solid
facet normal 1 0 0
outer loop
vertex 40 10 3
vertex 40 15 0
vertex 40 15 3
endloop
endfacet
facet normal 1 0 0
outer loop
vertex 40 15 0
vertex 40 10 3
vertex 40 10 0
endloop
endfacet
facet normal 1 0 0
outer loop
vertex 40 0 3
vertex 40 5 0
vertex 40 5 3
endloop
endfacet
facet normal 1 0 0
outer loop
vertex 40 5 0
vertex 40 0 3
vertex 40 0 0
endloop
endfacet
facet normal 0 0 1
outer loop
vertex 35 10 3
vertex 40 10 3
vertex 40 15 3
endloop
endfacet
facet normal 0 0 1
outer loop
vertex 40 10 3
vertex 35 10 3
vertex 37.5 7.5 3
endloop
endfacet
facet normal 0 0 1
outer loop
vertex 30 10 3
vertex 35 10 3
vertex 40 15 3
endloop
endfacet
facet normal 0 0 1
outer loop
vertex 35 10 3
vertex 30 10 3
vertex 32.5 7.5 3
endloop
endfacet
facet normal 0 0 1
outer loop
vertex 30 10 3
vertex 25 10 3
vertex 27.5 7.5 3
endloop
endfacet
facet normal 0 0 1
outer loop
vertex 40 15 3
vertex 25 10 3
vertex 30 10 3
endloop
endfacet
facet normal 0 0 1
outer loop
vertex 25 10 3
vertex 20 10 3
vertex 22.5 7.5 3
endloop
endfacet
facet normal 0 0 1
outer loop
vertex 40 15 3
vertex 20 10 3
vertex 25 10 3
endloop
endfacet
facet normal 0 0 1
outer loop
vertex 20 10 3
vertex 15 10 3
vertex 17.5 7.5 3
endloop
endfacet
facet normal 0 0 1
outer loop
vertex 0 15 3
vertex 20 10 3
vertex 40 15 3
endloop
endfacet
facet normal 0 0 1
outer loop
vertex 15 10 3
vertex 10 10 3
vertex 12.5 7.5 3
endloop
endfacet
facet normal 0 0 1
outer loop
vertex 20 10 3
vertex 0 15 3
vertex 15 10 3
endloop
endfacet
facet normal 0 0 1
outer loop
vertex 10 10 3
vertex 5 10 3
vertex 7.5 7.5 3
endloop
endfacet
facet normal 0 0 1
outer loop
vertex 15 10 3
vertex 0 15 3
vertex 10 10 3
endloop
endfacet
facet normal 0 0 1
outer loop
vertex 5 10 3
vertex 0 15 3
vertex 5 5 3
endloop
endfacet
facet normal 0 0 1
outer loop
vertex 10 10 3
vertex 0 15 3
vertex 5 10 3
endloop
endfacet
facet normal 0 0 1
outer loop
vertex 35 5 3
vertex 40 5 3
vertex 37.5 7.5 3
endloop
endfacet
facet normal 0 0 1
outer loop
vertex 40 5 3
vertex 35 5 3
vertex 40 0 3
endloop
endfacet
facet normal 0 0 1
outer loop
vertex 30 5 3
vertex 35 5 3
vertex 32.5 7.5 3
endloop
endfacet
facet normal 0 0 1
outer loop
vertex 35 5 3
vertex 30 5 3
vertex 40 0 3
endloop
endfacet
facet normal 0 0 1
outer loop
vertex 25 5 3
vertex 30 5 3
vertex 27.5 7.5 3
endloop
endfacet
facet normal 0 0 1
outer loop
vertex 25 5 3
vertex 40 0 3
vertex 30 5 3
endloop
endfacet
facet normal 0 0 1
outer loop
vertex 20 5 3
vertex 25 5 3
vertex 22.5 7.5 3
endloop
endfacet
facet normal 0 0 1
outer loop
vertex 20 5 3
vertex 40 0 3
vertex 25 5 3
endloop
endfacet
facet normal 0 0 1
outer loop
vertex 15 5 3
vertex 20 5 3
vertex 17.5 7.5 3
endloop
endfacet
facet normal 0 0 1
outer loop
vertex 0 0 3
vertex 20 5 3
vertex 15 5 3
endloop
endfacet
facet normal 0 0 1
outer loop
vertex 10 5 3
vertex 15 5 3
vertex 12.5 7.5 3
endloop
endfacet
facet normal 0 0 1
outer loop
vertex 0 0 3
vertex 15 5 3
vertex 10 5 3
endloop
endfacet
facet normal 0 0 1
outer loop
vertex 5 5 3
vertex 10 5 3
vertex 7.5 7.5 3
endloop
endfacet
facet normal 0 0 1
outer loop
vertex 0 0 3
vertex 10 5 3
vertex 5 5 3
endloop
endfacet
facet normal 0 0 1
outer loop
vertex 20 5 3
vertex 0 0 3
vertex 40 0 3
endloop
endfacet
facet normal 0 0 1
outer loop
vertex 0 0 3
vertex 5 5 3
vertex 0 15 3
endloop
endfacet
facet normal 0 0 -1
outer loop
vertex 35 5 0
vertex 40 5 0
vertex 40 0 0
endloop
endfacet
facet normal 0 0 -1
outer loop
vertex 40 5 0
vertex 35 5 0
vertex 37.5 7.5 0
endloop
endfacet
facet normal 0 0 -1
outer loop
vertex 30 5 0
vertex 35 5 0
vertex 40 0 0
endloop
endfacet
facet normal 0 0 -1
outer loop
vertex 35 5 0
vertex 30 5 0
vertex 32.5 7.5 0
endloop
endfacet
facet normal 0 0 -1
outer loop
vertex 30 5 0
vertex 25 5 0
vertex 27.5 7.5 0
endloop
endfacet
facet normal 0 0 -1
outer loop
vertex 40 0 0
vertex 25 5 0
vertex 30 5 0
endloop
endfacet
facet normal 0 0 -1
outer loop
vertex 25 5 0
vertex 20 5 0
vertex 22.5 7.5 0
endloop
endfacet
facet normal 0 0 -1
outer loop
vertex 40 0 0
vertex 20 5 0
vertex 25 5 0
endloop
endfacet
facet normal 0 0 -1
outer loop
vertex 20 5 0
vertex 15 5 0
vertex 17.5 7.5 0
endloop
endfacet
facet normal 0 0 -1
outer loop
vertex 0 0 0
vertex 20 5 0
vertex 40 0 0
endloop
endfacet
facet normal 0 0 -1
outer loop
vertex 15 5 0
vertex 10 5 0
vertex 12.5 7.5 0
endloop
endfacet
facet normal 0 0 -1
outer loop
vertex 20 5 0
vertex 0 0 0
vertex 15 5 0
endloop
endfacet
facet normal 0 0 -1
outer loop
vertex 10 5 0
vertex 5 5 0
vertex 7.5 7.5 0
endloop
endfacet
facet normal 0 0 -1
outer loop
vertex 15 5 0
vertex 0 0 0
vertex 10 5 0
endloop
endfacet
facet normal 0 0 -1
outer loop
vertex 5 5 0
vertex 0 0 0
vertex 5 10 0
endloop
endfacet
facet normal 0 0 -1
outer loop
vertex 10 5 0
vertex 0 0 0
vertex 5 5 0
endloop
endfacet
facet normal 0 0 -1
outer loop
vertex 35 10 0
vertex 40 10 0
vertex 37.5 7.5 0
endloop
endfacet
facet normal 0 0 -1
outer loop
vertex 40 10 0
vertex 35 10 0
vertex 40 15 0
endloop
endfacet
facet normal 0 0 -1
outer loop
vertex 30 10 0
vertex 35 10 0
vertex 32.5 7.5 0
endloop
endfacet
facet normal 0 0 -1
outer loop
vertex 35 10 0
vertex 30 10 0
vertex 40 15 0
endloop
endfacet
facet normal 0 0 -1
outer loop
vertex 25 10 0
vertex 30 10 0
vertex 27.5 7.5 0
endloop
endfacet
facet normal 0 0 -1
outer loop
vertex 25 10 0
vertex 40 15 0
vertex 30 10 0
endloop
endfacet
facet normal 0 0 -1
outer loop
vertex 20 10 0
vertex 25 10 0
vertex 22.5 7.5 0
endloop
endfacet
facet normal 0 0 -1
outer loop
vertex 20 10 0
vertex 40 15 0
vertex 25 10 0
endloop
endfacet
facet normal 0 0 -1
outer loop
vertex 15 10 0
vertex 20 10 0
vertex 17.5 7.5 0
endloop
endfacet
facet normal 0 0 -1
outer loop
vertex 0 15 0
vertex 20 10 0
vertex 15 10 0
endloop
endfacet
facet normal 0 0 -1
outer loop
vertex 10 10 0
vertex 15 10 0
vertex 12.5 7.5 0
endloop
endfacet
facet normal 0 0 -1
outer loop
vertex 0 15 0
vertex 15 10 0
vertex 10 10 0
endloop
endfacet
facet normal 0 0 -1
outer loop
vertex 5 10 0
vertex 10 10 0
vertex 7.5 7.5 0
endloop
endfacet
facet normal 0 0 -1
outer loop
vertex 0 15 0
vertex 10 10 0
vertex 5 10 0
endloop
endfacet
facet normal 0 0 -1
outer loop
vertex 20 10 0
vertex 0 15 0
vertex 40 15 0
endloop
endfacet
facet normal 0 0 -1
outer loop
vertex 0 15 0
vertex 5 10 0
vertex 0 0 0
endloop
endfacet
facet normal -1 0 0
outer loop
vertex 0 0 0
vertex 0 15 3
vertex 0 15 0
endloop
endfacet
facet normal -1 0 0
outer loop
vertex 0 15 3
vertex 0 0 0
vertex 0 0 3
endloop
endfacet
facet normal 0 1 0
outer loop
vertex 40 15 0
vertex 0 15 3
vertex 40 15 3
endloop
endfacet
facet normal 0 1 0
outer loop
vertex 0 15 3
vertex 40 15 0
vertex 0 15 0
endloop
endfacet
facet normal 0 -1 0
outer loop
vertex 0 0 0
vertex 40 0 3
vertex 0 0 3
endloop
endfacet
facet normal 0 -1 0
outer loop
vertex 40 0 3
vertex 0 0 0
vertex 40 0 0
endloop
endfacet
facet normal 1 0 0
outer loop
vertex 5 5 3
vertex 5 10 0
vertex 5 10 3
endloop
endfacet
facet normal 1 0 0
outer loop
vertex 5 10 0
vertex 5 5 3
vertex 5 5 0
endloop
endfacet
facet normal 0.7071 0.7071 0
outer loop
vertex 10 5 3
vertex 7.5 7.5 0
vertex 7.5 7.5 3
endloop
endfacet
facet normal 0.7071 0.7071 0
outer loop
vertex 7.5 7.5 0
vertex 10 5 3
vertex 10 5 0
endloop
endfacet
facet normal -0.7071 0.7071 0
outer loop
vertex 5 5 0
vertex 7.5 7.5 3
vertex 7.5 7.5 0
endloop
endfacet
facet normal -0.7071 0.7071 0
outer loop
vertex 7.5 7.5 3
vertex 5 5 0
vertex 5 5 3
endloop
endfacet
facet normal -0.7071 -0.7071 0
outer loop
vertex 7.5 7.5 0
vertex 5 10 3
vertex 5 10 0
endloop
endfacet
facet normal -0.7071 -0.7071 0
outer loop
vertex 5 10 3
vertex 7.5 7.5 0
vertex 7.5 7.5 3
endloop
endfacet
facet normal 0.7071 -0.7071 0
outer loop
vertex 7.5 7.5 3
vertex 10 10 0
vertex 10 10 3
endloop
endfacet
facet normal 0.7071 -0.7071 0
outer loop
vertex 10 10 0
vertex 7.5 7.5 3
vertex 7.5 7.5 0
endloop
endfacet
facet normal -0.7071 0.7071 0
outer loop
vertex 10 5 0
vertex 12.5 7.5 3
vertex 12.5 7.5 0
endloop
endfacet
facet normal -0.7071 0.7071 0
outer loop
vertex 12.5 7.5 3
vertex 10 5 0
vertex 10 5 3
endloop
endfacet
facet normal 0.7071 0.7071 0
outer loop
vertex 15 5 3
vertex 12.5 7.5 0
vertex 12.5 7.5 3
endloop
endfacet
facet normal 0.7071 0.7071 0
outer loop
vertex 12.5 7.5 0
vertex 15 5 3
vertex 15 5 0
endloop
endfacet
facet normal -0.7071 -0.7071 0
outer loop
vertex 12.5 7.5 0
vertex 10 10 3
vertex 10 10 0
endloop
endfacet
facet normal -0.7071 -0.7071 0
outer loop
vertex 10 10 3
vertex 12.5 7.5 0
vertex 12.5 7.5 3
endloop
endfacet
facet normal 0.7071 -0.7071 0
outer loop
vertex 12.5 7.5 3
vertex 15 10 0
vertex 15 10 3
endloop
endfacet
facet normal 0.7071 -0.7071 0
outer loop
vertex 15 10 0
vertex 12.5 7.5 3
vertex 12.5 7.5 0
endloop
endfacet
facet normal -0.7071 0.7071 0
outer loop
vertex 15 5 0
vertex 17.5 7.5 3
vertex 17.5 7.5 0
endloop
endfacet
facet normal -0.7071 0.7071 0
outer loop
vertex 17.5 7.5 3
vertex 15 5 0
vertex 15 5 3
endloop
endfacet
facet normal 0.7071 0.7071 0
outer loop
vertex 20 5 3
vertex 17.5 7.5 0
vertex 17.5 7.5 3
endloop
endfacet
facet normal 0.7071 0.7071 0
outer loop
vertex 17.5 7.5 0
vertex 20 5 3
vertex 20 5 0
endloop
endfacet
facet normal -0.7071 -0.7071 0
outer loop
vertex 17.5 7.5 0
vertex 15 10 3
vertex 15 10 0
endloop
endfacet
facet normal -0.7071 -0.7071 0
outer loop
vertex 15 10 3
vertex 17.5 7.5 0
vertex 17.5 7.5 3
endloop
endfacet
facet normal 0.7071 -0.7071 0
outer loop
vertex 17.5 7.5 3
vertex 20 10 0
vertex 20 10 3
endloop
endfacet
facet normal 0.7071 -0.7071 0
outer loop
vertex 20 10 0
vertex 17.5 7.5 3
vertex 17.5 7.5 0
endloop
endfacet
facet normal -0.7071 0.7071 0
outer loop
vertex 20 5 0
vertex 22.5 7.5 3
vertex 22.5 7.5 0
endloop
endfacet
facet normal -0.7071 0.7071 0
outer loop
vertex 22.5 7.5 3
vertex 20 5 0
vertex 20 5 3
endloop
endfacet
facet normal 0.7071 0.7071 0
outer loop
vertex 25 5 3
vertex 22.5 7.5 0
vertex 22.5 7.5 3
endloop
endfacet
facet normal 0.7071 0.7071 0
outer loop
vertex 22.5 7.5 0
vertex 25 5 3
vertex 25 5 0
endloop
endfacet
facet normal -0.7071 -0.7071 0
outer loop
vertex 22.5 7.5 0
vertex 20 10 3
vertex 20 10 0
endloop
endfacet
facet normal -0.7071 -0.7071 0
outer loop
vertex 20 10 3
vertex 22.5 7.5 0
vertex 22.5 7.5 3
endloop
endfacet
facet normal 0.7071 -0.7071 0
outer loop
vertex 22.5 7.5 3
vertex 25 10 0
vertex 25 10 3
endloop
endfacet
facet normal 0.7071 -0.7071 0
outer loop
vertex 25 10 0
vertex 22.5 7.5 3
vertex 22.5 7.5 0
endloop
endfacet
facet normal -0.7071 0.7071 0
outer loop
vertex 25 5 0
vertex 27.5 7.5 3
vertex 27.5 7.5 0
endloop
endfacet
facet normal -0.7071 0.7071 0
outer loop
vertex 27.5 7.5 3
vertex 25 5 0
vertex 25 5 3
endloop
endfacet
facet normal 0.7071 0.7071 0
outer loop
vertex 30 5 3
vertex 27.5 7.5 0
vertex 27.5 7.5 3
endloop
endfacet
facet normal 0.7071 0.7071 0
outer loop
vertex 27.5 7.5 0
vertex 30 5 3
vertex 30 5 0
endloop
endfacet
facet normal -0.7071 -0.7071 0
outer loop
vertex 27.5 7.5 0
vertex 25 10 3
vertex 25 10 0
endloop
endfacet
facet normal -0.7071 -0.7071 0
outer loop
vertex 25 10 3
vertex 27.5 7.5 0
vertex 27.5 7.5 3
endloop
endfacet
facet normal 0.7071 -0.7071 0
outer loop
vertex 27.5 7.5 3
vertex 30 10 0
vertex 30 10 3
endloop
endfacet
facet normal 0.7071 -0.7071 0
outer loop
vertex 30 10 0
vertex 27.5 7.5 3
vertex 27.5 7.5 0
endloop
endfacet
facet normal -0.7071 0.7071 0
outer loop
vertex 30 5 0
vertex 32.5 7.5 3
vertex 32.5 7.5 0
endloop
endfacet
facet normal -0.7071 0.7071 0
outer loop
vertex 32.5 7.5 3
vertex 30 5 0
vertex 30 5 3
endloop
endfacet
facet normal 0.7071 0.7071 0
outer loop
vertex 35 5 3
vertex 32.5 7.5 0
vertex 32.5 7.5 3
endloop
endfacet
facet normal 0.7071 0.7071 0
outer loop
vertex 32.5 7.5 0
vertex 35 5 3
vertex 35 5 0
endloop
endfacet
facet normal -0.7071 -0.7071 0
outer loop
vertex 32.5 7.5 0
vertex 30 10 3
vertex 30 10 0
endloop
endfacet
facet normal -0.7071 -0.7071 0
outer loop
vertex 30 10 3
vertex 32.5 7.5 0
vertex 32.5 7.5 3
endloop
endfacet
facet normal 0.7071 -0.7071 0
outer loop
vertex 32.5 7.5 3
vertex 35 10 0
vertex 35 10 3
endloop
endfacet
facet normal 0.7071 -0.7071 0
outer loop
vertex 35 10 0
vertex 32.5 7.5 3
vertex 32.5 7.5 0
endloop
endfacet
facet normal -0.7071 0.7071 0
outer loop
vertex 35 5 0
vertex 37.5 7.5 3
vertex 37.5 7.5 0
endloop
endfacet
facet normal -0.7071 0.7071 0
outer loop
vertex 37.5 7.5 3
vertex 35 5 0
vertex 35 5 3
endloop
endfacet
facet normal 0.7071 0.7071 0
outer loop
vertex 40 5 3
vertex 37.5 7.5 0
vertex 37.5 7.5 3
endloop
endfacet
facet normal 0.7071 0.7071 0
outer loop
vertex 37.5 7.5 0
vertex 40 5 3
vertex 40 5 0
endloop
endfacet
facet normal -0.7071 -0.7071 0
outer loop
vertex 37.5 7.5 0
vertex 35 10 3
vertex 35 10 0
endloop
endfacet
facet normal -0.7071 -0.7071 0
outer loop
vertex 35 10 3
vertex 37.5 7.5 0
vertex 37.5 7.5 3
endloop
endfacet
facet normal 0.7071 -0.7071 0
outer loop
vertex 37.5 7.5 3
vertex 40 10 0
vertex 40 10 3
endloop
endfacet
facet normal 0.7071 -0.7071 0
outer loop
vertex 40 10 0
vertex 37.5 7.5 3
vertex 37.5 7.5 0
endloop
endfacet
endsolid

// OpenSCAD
//Settings.
teeth_distance = 0;

//Calculations.
teeth_sidelength = 5 / sqrt(2);

difference() {
	cube([40, 15 + teeth_distance, 3]);
	translate([5, 5, -1]) {
		cube([36, 5 + teeth_distance, 5]);
	}
}
for(x = [7.5:5:37.5]) {
	translate([x, 5, 1.5]) {
		rotate([0, 0, 45]) {
			cube([teeth_sidelength, teeth_sidelength, 3], center=true);
		}
	}
	translate([x, 10 + teeth_distance, 1.5]) {
		rotate([0, 0, 45]) {
			cube([teeth_sidelength, teeth_sidelength, 3], center=true);
		}
	}
}
